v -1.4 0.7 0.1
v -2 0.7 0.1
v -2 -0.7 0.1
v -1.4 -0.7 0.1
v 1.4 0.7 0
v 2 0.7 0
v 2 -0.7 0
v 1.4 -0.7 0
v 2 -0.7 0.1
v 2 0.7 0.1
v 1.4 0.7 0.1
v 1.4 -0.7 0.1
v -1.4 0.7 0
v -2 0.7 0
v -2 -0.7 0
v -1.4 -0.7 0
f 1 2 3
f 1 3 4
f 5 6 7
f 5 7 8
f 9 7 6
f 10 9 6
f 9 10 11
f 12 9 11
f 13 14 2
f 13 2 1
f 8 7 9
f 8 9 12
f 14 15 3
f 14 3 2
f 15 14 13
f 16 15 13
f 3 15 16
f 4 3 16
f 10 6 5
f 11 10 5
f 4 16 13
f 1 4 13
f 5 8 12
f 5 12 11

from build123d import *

# Parameters (mm, degrees)
SKETCH049_W  = 0.6
SKETCH049_H  = 1.4
PAD030_DEPTH = 0.1


with BuildPart() as terminal003:
    # Sketch049 → Pad030 (new body)
    with BuildSketch(Plane.XY):
        with Locations((-1.7, 0)):
            Rectangle(SKETCH049_W, SKETCH049_H)
    extrude(amount=PAD030_DEPTH)


with BuildPart() as fusion003:
    # Mirror003: instance of Terminal003
    add(terminal003.part.mirror(Plane(origin=(0, 0, 0), x_dir=(0, -1, 0), z_dir=(1, 0, 0))))

    # Fusion003: union Terminal003
    add(terminal003.part)


solid = fusion003.part
